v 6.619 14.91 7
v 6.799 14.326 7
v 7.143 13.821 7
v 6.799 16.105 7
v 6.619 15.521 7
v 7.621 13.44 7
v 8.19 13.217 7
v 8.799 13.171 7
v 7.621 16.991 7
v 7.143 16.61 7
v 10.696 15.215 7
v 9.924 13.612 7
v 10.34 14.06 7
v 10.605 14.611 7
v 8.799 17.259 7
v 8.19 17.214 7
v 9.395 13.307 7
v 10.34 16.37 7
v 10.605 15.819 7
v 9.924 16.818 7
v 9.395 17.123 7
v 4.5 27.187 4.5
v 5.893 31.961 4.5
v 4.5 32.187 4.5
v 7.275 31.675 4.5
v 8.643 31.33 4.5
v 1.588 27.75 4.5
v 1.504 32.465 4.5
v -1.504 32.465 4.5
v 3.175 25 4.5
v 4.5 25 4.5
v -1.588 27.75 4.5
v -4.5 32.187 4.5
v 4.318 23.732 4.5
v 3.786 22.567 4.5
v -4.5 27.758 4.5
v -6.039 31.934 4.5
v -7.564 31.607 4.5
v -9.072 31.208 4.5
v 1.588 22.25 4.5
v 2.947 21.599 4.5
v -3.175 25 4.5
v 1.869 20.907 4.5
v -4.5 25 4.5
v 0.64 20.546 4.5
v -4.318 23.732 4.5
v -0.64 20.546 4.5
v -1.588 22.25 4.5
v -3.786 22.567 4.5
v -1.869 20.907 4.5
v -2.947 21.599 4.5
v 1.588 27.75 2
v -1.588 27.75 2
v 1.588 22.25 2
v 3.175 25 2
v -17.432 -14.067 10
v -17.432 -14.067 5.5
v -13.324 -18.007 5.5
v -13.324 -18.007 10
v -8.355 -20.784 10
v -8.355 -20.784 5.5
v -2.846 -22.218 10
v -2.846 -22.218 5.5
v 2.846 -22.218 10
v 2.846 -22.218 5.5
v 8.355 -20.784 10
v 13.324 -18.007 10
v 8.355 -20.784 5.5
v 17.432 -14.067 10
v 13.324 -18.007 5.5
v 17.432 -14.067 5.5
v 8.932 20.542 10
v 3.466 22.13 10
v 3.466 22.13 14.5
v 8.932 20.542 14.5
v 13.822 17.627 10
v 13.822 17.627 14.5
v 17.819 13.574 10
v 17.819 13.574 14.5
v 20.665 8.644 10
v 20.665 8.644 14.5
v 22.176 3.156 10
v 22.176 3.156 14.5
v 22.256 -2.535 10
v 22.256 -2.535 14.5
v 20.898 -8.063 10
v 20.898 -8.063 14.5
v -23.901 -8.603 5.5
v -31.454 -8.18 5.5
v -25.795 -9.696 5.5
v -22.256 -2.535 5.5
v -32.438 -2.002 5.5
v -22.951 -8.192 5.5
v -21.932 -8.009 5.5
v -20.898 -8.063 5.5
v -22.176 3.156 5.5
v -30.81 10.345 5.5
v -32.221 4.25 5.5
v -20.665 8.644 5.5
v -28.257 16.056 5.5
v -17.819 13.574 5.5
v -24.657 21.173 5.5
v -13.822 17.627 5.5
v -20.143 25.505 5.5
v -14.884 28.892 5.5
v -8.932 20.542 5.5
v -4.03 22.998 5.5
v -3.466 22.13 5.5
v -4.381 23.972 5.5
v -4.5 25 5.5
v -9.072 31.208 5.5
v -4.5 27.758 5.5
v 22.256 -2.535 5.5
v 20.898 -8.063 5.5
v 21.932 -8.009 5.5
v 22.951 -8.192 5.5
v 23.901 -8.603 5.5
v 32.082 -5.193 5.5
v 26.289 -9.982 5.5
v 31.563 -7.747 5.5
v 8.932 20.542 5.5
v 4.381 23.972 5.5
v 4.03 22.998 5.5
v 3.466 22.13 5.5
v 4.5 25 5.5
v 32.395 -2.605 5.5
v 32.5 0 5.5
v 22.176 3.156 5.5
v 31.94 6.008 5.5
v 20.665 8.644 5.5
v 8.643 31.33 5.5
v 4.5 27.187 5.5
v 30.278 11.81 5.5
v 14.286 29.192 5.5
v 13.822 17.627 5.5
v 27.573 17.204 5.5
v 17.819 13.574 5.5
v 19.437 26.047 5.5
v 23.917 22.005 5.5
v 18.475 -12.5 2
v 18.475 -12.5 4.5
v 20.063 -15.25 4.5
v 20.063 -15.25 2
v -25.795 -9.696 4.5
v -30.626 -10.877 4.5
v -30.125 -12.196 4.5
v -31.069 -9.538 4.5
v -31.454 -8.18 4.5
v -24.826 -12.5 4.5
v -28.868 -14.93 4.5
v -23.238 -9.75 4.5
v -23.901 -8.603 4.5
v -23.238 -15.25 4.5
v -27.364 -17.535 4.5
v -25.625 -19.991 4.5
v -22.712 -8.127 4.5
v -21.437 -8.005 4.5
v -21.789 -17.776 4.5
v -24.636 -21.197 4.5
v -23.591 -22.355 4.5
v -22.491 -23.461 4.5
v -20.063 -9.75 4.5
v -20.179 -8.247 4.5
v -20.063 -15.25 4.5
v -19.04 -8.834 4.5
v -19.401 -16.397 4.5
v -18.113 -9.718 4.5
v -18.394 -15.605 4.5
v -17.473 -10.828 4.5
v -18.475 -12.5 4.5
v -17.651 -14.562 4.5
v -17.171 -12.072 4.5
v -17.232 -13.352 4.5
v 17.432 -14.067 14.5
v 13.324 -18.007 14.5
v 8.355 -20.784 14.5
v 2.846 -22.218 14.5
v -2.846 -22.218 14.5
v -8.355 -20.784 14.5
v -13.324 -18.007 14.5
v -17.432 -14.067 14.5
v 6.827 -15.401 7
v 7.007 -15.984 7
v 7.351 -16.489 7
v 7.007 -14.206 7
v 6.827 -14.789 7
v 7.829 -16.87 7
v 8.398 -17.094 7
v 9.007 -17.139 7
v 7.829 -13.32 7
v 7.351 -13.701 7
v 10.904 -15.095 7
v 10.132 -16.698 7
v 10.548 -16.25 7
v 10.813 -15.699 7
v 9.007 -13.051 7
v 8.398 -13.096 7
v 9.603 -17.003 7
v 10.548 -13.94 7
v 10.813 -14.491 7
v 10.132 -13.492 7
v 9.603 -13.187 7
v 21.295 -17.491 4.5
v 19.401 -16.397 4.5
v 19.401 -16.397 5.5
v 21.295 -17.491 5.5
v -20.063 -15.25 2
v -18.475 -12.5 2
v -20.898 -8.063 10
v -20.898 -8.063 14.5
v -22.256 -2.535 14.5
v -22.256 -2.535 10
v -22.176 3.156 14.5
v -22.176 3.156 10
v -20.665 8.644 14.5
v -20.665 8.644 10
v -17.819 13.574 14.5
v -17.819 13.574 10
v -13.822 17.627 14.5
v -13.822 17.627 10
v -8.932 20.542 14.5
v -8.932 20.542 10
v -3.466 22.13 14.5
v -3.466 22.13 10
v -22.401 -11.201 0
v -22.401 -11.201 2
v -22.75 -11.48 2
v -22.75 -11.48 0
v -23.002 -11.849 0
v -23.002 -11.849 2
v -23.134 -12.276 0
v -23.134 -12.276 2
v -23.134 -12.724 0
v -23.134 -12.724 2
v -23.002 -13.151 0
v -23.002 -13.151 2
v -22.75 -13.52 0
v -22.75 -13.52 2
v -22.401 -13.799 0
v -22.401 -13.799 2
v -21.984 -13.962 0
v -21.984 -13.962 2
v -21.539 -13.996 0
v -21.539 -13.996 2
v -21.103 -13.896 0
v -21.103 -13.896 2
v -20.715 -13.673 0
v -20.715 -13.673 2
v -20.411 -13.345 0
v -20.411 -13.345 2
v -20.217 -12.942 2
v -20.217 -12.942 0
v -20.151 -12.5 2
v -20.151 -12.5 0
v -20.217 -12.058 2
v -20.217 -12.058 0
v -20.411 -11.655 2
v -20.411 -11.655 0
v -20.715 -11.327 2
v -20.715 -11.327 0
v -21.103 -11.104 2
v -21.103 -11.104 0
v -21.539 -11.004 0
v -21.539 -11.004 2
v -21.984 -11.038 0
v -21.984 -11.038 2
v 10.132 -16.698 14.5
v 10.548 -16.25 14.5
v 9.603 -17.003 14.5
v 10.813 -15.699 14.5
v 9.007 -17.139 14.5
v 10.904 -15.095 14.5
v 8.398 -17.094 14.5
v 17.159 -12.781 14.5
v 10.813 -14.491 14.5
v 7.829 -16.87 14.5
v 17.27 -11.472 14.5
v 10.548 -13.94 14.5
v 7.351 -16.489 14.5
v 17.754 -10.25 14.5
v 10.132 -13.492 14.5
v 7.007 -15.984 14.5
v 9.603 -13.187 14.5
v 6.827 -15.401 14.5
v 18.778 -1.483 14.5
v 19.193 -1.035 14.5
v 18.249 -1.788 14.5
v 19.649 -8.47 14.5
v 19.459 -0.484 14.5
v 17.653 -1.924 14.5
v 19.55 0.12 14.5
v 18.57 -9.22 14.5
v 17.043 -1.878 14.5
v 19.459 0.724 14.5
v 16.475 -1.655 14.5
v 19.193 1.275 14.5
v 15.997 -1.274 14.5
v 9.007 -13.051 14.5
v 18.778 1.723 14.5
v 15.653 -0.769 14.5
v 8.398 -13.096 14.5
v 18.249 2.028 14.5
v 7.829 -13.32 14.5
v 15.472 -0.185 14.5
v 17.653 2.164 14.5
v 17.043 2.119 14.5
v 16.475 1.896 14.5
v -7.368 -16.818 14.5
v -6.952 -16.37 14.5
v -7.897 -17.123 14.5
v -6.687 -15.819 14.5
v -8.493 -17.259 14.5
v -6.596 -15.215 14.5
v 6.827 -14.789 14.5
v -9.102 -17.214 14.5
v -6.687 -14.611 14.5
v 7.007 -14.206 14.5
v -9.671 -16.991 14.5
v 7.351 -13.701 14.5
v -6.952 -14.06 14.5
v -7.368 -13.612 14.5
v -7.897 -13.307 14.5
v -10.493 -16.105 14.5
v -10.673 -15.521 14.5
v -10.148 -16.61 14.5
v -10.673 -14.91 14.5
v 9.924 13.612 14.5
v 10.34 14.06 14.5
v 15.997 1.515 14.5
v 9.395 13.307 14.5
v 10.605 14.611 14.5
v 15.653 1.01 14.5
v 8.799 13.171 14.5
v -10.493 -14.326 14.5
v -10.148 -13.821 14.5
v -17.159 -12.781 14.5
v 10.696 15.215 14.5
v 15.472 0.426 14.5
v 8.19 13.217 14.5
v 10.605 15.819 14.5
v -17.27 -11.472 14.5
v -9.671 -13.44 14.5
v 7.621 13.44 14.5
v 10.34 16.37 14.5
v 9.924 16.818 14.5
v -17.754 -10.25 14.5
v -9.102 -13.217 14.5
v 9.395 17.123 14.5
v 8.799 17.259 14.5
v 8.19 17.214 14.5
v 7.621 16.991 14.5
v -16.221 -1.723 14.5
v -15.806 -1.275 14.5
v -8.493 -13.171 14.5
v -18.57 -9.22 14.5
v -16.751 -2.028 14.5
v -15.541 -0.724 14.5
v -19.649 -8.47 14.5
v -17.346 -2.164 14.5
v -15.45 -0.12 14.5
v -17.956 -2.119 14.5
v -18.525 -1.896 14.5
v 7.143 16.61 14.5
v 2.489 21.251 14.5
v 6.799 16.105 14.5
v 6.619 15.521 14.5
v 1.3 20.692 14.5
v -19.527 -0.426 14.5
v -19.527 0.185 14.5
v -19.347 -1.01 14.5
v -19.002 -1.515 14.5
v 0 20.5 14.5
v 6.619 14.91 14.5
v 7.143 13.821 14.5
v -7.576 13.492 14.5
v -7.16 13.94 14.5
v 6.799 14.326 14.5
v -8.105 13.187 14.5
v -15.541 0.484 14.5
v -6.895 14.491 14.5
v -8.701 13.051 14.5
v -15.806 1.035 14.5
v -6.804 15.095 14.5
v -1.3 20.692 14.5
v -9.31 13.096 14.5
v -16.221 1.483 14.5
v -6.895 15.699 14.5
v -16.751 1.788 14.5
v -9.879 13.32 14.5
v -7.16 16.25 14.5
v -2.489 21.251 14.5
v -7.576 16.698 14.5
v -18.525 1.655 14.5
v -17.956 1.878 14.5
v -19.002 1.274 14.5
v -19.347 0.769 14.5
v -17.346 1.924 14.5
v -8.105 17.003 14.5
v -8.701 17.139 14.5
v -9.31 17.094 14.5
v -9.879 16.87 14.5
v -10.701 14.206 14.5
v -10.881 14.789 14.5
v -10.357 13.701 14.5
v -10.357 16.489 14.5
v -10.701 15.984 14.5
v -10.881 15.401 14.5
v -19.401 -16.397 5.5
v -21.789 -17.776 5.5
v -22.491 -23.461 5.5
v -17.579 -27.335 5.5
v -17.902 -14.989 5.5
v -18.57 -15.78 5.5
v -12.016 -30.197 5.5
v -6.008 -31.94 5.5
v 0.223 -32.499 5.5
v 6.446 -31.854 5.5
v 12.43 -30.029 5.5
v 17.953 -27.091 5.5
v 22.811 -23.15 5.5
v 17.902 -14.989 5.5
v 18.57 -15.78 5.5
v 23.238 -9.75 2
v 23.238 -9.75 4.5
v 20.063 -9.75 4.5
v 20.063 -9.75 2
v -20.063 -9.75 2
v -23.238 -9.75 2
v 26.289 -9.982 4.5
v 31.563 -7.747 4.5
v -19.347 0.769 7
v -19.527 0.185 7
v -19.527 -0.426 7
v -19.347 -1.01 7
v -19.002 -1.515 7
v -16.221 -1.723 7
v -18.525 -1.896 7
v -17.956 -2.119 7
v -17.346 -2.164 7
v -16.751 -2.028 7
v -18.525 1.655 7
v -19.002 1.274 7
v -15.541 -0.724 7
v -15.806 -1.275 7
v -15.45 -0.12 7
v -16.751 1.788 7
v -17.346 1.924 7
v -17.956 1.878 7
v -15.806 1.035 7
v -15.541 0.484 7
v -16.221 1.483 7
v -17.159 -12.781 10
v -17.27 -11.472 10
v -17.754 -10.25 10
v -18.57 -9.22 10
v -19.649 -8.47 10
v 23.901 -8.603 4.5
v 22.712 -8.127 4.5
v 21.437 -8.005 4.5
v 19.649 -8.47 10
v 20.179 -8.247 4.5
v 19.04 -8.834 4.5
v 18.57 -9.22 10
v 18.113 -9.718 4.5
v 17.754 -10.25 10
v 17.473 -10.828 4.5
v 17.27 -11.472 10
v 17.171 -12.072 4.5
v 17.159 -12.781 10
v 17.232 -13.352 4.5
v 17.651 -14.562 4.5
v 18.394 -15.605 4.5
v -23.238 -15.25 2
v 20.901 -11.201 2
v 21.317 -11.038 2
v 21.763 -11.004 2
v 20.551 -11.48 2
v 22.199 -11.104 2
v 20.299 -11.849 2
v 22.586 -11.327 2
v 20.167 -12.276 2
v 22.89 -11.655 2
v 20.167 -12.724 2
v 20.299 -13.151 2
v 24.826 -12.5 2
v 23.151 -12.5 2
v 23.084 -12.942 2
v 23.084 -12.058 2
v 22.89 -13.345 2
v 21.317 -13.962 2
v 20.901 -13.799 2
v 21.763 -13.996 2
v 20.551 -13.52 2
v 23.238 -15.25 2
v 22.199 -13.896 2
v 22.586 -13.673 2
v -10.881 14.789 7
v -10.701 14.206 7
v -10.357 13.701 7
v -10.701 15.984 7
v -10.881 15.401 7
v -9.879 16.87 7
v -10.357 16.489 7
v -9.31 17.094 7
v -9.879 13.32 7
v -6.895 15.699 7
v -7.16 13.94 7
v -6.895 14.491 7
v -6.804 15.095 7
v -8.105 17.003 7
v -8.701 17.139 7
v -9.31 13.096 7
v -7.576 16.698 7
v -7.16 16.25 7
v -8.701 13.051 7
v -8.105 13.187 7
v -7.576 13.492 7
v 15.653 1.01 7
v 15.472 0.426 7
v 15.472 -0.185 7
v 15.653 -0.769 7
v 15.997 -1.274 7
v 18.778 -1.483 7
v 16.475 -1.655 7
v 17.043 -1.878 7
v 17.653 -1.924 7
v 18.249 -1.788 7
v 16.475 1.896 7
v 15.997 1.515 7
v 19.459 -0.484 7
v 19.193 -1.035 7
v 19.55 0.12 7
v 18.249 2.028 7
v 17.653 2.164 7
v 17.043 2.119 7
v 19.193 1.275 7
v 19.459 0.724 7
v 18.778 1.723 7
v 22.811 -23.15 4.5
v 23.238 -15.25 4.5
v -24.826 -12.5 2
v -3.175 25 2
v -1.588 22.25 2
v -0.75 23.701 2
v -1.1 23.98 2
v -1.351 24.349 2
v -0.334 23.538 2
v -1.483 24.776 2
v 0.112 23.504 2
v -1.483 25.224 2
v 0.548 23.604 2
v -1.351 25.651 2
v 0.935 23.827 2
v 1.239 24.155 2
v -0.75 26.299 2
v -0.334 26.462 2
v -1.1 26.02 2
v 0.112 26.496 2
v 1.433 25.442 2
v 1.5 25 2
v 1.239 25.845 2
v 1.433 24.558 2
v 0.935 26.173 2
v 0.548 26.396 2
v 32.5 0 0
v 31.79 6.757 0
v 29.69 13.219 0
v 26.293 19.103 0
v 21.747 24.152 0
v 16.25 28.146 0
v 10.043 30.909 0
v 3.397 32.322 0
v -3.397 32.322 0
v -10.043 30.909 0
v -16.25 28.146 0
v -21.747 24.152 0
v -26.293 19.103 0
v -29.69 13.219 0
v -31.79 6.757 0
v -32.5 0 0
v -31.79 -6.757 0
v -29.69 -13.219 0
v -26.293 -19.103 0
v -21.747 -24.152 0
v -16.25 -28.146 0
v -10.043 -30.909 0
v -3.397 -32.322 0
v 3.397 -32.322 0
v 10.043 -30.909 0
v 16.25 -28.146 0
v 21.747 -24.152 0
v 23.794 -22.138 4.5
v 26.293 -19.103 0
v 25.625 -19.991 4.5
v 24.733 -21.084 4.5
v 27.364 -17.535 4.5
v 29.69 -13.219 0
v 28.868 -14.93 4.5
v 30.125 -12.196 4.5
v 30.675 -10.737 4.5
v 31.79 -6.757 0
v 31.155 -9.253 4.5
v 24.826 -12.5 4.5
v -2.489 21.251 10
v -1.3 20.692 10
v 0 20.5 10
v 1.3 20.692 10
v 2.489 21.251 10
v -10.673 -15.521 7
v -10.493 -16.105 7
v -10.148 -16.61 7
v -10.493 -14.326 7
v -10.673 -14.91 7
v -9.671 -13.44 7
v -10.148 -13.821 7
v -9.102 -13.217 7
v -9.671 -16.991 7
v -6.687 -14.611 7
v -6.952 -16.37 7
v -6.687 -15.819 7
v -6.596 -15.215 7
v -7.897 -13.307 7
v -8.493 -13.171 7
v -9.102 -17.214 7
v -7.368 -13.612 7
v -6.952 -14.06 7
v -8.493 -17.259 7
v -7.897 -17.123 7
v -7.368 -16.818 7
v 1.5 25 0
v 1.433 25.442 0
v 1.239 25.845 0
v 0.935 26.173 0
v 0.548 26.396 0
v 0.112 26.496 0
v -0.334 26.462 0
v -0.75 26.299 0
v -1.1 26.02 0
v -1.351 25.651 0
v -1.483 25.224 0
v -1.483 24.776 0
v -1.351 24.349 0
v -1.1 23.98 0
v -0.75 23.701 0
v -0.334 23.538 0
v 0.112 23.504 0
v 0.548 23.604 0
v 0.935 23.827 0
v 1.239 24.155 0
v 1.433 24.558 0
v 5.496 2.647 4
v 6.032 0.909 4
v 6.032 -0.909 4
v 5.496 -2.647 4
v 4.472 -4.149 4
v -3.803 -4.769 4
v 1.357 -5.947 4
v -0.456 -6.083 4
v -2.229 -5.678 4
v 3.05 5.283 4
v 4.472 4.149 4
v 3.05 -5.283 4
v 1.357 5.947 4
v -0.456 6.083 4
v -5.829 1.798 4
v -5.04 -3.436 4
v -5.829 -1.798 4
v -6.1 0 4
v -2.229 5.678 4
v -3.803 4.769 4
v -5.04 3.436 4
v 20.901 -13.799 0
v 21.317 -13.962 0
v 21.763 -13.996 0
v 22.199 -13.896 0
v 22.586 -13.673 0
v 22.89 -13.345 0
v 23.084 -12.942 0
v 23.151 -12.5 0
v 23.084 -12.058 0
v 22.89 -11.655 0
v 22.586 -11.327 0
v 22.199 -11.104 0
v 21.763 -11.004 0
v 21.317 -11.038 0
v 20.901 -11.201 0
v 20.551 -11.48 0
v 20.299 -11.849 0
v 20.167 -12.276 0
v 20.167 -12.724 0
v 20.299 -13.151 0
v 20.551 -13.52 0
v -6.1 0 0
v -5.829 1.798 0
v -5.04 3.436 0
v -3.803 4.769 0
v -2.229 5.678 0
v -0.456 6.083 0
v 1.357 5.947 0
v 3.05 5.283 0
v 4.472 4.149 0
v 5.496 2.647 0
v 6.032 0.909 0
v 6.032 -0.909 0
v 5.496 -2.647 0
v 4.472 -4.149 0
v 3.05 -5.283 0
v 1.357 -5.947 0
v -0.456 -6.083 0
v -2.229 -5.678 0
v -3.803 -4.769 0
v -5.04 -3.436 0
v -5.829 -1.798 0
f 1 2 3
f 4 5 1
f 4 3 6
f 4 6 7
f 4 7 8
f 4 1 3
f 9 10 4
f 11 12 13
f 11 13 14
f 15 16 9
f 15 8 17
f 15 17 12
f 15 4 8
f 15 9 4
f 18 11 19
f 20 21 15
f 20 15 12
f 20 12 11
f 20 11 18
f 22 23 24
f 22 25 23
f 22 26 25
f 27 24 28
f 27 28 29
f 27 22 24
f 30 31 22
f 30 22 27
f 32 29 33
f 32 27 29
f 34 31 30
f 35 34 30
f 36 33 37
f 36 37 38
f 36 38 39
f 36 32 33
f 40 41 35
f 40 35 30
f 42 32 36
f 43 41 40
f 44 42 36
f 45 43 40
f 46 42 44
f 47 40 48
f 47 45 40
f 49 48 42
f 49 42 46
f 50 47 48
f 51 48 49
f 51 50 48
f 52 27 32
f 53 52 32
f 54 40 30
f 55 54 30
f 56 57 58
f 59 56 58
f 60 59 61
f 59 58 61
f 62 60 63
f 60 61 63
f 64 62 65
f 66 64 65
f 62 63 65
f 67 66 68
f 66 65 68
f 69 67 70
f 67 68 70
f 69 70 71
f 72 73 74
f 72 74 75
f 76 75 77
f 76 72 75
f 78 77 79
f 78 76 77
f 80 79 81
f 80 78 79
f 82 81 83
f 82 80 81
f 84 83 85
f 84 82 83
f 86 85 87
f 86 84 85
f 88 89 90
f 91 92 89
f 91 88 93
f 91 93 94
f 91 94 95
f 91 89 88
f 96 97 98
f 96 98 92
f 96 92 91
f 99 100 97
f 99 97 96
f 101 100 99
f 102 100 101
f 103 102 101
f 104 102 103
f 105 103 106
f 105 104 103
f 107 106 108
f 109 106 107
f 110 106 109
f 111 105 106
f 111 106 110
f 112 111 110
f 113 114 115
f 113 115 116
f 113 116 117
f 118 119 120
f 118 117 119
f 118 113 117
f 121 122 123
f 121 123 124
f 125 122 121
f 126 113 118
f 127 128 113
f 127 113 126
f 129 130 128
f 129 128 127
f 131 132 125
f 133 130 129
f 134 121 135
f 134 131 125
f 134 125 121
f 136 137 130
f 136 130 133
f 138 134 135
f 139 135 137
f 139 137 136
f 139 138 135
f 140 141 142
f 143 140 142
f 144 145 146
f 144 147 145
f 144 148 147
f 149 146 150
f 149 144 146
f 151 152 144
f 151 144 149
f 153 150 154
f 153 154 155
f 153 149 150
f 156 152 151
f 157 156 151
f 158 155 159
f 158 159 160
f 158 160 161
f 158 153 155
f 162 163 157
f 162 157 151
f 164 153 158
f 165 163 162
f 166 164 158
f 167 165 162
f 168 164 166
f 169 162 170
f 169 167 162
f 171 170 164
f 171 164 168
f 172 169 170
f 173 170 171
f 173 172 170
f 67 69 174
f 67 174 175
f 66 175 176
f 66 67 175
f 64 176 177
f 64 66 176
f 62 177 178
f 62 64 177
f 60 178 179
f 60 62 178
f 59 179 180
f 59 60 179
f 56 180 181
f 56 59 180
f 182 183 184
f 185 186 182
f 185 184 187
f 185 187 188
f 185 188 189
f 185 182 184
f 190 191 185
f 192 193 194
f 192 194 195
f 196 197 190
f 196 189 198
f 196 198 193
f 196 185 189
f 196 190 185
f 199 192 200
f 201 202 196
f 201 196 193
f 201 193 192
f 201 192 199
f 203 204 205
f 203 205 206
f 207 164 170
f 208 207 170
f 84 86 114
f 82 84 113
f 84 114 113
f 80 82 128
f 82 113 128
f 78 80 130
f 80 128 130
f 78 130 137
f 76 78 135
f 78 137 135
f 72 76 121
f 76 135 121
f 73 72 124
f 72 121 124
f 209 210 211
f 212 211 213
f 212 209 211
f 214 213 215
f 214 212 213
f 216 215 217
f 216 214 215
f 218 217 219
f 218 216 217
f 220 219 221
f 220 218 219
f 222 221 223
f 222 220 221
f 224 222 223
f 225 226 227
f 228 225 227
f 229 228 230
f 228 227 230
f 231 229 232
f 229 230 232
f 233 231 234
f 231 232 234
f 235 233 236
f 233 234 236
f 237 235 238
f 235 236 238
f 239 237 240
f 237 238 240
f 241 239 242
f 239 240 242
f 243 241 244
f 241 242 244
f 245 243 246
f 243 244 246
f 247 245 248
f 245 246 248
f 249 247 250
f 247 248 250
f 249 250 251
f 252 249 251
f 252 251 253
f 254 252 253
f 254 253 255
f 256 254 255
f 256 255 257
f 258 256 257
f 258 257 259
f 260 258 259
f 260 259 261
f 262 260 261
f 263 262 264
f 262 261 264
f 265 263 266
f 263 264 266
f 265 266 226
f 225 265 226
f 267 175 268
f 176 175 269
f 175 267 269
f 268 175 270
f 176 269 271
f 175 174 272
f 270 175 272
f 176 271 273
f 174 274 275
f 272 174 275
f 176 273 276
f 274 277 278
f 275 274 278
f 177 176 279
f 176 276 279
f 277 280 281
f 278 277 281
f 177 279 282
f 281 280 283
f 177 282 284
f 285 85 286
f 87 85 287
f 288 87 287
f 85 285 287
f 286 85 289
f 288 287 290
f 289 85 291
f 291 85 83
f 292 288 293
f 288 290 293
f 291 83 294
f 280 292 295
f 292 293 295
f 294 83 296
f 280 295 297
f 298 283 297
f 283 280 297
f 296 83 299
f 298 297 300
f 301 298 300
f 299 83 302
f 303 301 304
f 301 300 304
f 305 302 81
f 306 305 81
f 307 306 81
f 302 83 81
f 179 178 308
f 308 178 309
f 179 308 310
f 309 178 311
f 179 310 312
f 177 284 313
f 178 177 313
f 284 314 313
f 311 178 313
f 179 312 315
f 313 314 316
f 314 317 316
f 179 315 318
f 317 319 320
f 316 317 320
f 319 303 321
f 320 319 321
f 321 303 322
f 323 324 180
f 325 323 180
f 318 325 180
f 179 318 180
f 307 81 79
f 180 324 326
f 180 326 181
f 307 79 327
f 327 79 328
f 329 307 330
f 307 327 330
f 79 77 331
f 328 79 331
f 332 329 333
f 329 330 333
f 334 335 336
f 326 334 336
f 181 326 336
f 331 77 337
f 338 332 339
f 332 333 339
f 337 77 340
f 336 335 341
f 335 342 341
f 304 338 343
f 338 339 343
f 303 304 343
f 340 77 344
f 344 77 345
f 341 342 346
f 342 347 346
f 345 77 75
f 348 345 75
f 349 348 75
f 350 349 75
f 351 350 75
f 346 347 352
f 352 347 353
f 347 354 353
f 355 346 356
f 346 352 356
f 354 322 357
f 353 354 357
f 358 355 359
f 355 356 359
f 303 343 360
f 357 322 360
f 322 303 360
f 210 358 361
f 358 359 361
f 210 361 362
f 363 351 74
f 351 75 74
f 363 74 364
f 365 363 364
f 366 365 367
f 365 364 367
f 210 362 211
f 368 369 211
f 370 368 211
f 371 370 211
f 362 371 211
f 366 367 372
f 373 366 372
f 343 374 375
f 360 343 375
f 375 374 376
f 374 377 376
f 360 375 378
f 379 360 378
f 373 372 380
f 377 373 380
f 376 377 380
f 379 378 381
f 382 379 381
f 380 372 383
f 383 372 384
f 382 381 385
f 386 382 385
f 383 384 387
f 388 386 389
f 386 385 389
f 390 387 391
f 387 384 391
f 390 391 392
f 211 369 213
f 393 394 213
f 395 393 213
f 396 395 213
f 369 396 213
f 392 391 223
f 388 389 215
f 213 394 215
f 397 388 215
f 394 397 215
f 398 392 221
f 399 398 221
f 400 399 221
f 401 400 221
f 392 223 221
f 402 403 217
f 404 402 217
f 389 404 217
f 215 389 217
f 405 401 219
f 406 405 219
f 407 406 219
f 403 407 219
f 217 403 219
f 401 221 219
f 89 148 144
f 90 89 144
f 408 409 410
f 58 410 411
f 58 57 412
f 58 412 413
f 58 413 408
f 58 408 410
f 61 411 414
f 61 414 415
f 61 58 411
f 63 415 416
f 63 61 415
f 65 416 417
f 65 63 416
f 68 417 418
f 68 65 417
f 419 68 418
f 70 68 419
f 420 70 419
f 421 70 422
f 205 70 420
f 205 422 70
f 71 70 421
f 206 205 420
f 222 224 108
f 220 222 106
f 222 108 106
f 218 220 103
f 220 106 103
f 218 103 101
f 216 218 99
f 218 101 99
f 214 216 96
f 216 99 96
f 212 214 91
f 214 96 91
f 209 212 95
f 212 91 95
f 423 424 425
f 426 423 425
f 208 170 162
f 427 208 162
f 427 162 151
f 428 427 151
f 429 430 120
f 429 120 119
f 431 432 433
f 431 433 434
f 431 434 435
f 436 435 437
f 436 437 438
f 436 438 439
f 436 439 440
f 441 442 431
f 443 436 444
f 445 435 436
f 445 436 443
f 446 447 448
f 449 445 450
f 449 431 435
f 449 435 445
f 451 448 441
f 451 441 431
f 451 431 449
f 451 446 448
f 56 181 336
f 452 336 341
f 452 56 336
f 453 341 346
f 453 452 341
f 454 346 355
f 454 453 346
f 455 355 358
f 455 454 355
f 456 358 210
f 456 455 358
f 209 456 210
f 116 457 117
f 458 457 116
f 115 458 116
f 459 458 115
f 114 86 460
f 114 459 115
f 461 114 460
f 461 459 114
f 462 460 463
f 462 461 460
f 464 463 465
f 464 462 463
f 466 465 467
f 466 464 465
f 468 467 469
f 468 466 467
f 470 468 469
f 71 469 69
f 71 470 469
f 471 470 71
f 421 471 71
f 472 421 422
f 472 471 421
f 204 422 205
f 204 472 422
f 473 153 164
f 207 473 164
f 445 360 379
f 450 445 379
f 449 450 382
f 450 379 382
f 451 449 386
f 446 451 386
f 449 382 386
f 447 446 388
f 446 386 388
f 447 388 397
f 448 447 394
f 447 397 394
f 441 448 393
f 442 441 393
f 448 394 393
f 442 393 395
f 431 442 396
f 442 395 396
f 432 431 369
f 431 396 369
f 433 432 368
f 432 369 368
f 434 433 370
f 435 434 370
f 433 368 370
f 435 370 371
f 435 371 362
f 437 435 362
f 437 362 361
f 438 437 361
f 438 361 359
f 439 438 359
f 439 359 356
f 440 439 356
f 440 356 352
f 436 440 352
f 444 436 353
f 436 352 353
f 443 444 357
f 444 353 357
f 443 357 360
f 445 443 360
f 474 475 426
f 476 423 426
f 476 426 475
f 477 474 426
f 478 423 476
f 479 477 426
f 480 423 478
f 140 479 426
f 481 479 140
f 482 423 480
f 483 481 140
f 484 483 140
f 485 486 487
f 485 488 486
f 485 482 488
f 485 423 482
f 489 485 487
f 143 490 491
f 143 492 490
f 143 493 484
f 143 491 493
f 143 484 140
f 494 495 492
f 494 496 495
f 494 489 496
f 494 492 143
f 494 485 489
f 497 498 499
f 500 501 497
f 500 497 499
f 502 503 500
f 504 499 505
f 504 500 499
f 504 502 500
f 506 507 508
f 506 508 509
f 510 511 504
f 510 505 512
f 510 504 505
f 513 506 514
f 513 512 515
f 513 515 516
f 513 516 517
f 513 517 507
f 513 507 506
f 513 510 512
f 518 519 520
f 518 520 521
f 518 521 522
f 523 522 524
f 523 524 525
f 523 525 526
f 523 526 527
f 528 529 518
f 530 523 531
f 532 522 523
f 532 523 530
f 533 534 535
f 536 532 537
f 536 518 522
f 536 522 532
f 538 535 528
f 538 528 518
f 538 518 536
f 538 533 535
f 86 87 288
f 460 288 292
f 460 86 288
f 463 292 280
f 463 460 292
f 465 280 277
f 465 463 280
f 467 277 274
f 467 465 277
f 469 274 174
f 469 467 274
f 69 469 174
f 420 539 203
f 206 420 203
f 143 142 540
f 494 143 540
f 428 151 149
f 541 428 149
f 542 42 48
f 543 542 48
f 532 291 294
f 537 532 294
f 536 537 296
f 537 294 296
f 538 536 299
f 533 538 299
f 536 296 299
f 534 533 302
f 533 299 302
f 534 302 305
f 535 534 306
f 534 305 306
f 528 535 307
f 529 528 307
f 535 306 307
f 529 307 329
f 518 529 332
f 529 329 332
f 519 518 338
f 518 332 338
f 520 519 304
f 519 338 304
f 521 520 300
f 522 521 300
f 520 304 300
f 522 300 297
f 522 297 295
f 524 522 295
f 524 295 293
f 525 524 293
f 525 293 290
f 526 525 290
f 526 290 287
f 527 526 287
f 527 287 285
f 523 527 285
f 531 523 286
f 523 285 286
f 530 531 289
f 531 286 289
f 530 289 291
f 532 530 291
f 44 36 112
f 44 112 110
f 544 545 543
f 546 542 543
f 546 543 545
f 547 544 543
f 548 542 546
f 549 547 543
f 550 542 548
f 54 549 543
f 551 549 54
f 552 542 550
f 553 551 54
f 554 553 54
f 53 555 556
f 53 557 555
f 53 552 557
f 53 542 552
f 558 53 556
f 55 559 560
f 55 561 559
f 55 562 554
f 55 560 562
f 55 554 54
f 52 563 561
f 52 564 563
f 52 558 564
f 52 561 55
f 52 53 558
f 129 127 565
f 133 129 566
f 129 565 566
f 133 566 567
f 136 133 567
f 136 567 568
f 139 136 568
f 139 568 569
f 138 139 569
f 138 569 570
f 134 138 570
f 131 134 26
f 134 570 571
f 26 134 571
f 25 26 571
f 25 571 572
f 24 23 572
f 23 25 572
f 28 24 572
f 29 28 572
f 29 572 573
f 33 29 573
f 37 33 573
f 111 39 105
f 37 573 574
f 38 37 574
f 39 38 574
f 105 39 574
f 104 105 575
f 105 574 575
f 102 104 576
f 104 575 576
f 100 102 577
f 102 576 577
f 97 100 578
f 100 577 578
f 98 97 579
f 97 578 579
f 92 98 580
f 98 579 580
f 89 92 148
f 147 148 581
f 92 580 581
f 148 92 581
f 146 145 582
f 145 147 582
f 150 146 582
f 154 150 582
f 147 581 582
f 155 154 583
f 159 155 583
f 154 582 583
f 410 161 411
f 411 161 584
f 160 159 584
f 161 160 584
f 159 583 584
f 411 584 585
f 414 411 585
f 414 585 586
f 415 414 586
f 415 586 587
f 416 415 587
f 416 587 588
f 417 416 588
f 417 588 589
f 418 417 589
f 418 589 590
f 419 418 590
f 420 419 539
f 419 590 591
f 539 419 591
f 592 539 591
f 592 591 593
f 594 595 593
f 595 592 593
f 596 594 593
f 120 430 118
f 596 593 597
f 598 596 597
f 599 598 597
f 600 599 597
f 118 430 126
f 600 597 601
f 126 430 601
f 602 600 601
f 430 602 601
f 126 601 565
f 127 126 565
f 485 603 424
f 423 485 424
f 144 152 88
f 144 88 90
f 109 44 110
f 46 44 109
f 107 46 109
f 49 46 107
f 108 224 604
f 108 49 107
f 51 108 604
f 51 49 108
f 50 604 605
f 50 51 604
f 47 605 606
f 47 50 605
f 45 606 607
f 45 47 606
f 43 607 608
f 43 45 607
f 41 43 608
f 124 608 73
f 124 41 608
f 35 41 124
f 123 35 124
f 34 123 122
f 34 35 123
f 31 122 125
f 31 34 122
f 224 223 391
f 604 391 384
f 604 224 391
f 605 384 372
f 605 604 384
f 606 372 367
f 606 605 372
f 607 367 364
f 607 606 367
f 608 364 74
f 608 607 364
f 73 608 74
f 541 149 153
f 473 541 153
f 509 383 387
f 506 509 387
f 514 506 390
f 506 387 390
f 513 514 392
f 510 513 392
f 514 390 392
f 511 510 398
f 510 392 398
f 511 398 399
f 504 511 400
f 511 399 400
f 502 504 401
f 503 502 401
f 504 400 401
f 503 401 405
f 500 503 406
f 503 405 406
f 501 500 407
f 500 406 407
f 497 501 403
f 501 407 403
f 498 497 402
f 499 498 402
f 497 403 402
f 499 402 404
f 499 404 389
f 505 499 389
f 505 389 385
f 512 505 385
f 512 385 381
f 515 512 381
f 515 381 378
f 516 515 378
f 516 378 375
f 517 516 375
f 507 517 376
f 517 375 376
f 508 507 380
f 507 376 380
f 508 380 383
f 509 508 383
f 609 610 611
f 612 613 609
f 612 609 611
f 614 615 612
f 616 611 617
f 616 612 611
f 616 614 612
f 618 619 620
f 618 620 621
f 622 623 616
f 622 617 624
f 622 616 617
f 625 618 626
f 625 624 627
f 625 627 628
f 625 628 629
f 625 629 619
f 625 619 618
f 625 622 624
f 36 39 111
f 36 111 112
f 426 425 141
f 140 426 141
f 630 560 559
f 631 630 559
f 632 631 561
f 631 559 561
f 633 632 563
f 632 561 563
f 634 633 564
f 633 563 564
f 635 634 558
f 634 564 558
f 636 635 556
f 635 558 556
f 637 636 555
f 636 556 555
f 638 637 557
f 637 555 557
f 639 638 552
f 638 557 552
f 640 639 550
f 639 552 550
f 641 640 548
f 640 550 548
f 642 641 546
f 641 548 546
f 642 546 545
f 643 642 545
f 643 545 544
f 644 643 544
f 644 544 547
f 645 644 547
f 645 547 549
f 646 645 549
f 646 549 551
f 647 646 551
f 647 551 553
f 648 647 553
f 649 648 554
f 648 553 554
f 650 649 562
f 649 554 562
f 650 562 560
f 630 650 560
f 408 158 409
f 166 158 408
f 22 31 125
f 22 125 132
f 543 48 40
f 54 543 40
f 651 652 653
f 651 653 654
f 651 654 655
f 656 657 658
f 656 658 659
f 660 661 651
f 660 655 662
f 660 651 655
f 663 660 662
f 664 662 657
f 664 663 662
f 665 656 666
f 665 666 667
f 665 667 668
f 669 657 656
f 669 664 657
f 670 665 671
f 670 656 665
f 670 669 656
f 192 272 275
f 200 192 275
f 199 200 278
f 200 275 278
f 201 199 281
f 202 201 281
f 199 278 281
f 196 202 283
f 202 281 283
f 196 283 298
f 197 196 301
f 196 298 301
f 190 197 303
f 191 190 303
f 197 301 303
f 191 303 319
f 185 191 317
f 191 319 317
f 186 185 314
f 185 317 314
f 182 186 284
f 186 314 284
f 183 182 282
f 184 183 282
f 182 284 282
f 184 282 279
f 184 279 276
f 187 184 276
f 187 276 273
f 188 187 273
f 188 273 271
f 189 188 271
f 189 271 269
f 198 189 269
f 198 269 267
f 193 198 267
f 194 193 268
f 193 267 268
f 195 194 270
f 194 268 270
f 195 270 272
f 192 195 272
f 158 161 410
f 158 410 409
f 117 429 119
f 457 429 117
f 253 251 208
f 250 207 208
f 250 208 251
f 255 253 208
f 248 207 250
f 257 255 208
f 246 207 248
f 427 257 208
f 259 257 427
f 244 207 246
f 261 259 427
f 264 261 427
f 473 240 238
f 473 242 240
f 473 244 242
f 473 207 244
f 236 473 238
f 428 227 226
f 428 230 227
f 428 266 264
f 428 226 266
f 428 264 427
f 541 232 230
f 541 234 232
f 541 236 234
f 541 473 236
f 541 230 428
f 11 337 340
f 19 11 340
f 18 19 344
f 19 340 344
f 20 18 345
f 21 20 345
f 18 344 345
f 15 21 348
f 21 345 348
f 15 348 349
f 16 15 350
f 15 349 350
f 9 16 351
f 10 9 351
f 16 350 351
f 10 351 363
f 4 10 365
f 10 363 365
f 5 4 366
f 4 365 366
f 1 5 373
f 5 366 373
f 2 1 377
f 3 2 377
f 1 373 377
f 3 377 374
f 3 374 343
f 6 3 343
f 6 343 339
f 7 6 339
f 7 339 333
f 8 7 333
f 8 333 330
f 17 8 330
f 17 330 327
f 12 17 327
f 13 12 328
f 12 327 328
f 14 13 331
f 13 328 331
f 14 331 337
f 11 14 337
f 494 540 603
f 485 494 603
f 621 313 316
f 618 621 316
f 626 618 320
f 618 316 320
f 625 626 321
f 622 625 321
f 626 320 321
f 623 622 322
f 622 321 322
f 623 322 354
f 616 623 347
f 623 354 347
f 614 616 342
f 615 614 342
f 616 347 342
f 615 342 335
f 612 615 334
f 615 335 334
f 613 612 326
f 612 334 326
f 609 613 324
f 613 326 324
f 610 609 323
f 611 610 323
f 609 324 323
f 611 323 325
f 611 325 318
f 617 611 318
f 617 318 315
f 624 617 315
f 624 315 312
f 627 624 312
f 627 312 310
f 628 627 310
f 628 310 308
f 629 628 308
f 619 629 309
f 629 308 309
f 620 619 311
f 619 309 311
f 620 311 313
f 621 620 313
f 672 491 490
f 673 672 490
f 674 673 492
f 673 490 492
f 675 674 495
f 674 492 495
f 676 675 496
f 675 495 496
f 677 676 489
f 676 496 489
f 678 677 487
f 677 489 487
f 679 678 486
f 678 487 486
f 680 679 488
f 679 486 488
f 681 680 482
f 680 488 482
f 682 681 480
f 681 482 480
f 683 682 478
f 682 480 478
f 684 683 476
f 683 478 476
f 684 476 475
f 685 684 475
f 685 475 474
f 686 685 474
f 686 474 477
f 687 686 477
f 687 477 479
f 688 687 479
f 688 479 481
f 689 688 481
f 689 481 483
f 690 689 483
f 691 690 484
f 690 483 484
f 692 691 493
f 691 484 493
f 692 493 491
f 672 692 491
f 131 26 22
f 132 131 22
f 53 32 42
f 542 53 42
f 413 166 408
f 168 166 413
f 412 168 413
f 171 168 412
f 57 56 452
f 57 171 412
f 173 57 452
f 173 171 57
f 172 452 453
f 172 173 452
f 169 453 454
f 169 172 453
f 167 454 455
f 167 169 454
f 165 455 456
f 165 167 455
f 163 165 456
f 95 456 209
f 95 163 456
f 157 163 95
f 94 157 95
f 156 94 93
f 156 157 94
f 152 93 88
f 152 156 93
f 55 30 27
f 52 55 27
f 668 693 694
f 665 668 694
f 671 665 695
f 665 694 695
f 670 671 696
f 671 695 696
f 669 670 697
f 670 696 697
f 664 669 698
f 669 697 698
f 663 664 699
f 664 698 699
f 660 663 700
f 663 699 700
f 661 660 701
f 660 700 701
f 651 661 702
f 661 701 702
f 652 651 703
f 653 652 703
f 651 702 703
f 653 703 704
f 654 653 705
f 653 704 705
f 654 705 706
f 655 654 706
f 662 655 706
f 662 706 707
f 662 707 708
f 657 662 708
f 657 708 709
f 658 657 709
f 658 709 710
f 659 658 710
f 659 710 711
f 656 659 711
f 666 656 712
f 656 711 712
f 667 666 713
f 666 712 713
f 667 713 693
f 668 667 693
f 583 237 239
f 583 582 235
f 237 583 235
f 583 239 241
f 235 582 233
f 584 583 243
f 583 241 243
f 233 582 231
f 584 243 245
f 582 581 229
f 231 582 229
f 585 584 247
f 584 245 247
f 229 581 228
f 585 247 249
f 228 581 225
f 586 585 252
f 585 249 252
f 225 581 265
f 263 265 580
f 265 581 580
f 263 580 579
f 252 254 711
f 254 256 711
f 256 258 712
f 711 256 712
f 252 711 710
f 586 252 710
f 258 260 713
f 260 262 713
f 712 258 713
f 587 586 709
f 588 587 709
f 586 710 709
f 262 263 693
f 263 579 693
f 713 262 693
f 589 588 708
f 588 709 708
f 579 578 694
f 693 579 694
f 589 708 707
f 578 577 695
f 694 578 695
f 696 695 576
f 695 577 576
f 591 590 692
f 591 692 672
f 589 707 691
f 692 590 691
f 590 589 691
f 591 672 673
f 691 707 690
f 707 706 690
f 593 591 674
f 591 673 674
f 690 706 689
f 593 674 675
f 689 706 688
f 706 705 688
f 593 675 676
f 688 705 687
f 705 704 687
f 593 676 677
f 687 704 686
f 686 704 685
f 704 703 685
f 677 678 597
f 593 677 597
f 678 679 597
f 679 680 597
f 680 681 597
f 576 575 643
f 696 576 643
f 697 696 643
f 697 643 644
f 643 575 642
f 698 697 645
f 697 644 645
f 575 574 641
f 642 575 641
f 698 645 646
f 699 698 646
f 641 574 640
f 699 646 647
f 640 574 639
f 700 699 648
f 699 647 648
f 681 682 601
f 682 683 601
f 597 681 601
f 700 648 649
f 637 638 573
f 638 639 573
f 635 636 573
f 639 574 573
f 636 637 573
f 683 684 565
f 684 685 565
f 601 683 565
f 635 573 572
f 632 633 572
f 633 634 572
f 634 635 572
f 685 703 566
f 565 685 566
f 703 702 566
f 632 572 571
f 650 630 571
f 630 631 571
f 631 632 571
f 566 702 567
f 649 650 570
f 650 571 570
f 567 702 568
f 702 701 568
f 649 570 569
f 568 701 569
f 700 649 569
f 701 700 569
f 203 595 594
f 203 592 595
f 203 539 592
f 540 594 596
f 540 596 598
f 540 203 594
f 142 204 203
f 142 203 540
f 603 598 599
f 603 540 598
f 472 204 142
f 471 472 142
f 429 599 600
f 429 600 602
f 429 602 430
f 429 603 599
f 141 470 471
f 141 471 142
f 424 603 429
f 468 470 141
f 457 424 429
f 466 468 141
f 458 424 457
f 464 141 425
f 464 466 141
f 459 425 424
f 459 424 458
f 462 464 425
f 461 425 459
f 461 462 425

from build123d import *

# Parameters (mm, degrees)
SKETCH2_R           = 32.5
BOSS_EXTRUDE1_DEPTH = 10
SKETCH3_R           = 1.5
CUT_EXTRUDE2_DEPTH  = 48.037219306
CUT_EXTRUDE3_DEPTH  = 8
CUT_EXTRUDE5_START  = -5.5
CUT_EXTRUDE5_DEPTH  = 5.5
CIRPATTERN1_COUNT   = 3
CUT_EXTRUDE8_START  = -4.5
SKETCH8_R           = 22.4
CUT_EXTRUDE8_DEPTH  = 4.5
CHAMFER1_SIZE       = 4.429367468
CHAMFER1_SIZE_2     = 5
SKETCH7_R           = 6.1
CUT_EXTRUDE7_DEPTH  = 4
BOSS_EXTRUDE2_DEPTH = 4.5
SKETCH10_R          = 2.05
CUT_EXTRUDE9_DEPTH  = 7.5


with BuildPart() as part:
    # Sketch2 → Boss-Extrude1 (new body)
    with BuildSketch(Plane.XY):
        Circle(SKETCH2_R)
    extrude(amount=BOSS_EXTRUDE1_DEPTH)

    # Sketch3 → Cut-Extrude2 (cut, symmetric)
    with BuildSketch(Plane.XY):
        with Locations((0, 25)):
            Circle(SKETCH3_R)
    cut_extrude2 = extrude(amount=CUT_EXTRUDE2_DEPTH, both=True, mode=Mode.SUBTRACT)

    # Sketch4 → Cut-Extrude3 (cut)
    with BuildSketch(Plane.XY.offset(10)):
        Polygon((1.58771324, 22.25), (3.175426481, 25), (1.58771324, 27.75), (-1.58771324, 27.75), (-3.175426481, 25), (-1.58771324, 22.25), align=None)
    cut_extrude3 = extrude(amount=-CUT_EXTRUDE3_DEPTH, mode=Mode.SUBTRACT)

    # Sketch5 → Cut-Extrude5 (cut)
    with BuildSketch(Plane.XY.offset(10).offset(CUT_EXTRUDE5_START)):
        with BuildLine():
            Line((4.5, 25), (4.5, 32.186953879))
            ThreePointArc((4.5, 32.186953879), (0, 32.5), (-4.5, 32.186953879))
            Line((-4.5, 32.186953879), (-4.5, 25))
            ThreePointArc((-4.5, 25), (0, 20.5), (4.5, 25))
        make_face()
    cut_extrude5 = extrude(amount=CUT_EXTRUDE5_DEPTH, mode=Mode.SUBTRACT)

    # CirPattern1: Cut-Extrude2, Cut-Extrude3, Cut-Extrude5 ×3 about axis
    cirpattern1_axis = Axis((0, 0, 0), (0, 0, 1))
    add([cut_extrude2.rotate(cirpattern1_axis, i * 360 / CIRPATTERN1_COUNT) for i in range(1, CIRPATTERN1_COUNT)], mode=Mode.SUBTRACT)
    add([cut_extrude3.rotate(cirpattern1_axis, i * 360 / CIRPATTERN1_COUNT) for i in range(1, CIRPATTERN1_COUNT)], mode=Mode.SUBTRACT)
    add([cut_extrude5.rotate(cirpattern1_axis, i * 360 / CIRPATTERN1_COUNT) for i in range(1, CIRPATTERN1_COUNT)], mode=Mode.SUBTRACT)

    # Sketch8 → Cut-Extrude8 (cut)
    with BuildSketch(Plane.XY.offset(10).offset(CUT_EXTRUDE8_START)):
        with BuildLine():
            ThreePointArc((-30.12471973, -12.196362622), (-28.145825623, -16.25), (-25.62471973, -19.990591256))
            ThreePointArc((-25.62471973, -19.990591256), (0, -32.5), (25.62471973, -19.990591256))
            ThreePointArc((25.62471973, -19.990591256), (28.145825623, -16.25), (30.12471973, -12.196362622))
            ThreePointArc((30.12471973, -12.196362622), (28.145825623, 16.25), (4.5, 32.186953879))
            ThreePointArc((4.5, 32.186953879), (0, 32.5), (-4.5, 32.186953879))
            ThreePointArc((-4.5, 32.186953879), (-28.145825623, 16.25), (-30.12471973, -12.196362622))
        make_face()
        Circle(SKETCH8_R, mode=Mode.SUBTRACT)
    extrude(amount=CUT_EXTRUDE8_DEPTH, mode=Mode.SUBTRACT)

    # Chamfer1
    # the kernel refuses this chamfer: 5, 4.429367468 mm, written as the material it takes off along each edge
    with BuildSketch(Plane(origin=(-25.62471973, -19.990591256, 4.5), x_dir=(0.6702188271711587, -0.7421635424253312, 0), z_dir=(0, 0, 1)), Plane(origin=(30.12471973, -12.196362622, 4.5), x_dir=(0.3076230679174066, 0.9515083016375017, 0), z_dir=(0, 0, 1)), Plane(origin=(-4.5, 32.186953879, 4.5), x_dir=(-0.977841895088566, -0.2093447592121711, 0), z_dir=(0, 0, 1))) as chamfer1_piece_1:
        with BuildLine():
            Line((4.675763163, 0), (CHAMFER1_SIZE * 0.209344759198, CHAMFER1_SIZE * 0.977841895022))
            Line((CHAMFER1_SIZE * 0.209344759198, CHAMFER1_SIZE * 0.977841895022), (0, 0))
            ThreePointArc((0, 0), (2.403339666, -0.084130686), (4.675763163, 0))
        make_face()
    extrude(amount=13.02255857, mode=Mode.SUBTRACT)
    with BuildSketch(Plane(origin=(-30.12471973, -12.196362622, 4.5), x_dir=(-0.3141485775889788, 0.9493738311112337, 0), z_dir=(0, 0, 1)), Plane(origin=(25.62471973, -19.990591256, 4.5), x_dir=(-0.6651075666359972, -0.7467475643104184, 0), z_dir=(0, 0, 1)), Plane(origin=(4.5, 32.186953879, 4.5), x_dir=(0.9792561442249751, -0.20262626680081466, 0), z_dir=(0, 0, 1))) as chamfer1_piece_2:
        with BuildLine():
            Line((4.23053931, 0), (CHAMFER1_SIZE_2 * 0.202626266801, -CHAMFER1_SIZE_2 * 0.979256144225))
            Line((CHAMFER1_SIZE_2 * 0.202626266801, -CHAMFER1_SIZE_2 * 0.979256144225), (0, 0))
            ThreePointArc((0, 0), (2.170160838, 0.068863095), (4.23053931, 0))
        make_face()
    extrude(amount=13.85841494, mode=Mode.SUBTRACT)

    # Sketch7 → Cut-Extrude7 (cut)
    with BuildSketch(Plane(origin=(0, 0, 0), x_dir=(-1, 0, 0), z_dir=(0, 0, -1))):
        Circle(SKETCH7_R)
    extrude(amount=-CUT_EXTRUDE7_DEPTH, mode=Mode.SUBTRACT)

    # Sketch9 → Boss-Extrude2 (add)
    with BuildSketch(Plane.XY.offset(10)):
        with BuildLine():
            ThreePointArc((-3.466157521, 22.1302), (0, 20.5), (3.466157521, 22.1302))
            ThreePointArc((3.466157521, 22.1302), (19.398969045, 11.2), (20.898394151, -8.063319533))
            ThreePointArc((20.898394151, -8.063319533), (17.753520778, -10.25), (17.43223663, -14.066880467))
            ThreePointArc((17.43223663, -14.066880467), (0, -22.4), (-17.43223663, -14.066880467))
            ThreePointArc((-17.43223663, -14.066880467), (-17.753520778, -10.25), (-20.898394151, -8.063319533))
            ThreePointArc((-20.898394151, -8.063319533), (-19.398969045, 11.2), (-3.466157521, 22.1302))
        make_face()
    extrude(amount=BOSS_EXTRUDE2_DEPTH)

    # Sketch10 → Cut-Extrude9 (cut)
    with BuildSketch(Plane.XY.offset(14.5)):
        with Locations((-8.645741201, -15.215162144)):
            Circle(SKETCH10_R)
        with Locations((-17.49958754, -0.120149557)):
            Circle(SKETCH10_R)
        with Locations((-8.853846339, 15.095012587)):
            Circle(SKETCH10_R)
        with Locations((8.645741201, 15.215162144)):
            Circle(SKETCH10_R)
        with Locations((17.49958754, 0.120149557)):
            Circle(SKETCH10_R)
        with Locations((8.853846339, -15.095012587)):
            Circle(SKETCH10_R)
    extrude(amount=-CUT_EXTRUDE9_DEPTH, mode=Mode.SUBTRACT)


solid = part.part
